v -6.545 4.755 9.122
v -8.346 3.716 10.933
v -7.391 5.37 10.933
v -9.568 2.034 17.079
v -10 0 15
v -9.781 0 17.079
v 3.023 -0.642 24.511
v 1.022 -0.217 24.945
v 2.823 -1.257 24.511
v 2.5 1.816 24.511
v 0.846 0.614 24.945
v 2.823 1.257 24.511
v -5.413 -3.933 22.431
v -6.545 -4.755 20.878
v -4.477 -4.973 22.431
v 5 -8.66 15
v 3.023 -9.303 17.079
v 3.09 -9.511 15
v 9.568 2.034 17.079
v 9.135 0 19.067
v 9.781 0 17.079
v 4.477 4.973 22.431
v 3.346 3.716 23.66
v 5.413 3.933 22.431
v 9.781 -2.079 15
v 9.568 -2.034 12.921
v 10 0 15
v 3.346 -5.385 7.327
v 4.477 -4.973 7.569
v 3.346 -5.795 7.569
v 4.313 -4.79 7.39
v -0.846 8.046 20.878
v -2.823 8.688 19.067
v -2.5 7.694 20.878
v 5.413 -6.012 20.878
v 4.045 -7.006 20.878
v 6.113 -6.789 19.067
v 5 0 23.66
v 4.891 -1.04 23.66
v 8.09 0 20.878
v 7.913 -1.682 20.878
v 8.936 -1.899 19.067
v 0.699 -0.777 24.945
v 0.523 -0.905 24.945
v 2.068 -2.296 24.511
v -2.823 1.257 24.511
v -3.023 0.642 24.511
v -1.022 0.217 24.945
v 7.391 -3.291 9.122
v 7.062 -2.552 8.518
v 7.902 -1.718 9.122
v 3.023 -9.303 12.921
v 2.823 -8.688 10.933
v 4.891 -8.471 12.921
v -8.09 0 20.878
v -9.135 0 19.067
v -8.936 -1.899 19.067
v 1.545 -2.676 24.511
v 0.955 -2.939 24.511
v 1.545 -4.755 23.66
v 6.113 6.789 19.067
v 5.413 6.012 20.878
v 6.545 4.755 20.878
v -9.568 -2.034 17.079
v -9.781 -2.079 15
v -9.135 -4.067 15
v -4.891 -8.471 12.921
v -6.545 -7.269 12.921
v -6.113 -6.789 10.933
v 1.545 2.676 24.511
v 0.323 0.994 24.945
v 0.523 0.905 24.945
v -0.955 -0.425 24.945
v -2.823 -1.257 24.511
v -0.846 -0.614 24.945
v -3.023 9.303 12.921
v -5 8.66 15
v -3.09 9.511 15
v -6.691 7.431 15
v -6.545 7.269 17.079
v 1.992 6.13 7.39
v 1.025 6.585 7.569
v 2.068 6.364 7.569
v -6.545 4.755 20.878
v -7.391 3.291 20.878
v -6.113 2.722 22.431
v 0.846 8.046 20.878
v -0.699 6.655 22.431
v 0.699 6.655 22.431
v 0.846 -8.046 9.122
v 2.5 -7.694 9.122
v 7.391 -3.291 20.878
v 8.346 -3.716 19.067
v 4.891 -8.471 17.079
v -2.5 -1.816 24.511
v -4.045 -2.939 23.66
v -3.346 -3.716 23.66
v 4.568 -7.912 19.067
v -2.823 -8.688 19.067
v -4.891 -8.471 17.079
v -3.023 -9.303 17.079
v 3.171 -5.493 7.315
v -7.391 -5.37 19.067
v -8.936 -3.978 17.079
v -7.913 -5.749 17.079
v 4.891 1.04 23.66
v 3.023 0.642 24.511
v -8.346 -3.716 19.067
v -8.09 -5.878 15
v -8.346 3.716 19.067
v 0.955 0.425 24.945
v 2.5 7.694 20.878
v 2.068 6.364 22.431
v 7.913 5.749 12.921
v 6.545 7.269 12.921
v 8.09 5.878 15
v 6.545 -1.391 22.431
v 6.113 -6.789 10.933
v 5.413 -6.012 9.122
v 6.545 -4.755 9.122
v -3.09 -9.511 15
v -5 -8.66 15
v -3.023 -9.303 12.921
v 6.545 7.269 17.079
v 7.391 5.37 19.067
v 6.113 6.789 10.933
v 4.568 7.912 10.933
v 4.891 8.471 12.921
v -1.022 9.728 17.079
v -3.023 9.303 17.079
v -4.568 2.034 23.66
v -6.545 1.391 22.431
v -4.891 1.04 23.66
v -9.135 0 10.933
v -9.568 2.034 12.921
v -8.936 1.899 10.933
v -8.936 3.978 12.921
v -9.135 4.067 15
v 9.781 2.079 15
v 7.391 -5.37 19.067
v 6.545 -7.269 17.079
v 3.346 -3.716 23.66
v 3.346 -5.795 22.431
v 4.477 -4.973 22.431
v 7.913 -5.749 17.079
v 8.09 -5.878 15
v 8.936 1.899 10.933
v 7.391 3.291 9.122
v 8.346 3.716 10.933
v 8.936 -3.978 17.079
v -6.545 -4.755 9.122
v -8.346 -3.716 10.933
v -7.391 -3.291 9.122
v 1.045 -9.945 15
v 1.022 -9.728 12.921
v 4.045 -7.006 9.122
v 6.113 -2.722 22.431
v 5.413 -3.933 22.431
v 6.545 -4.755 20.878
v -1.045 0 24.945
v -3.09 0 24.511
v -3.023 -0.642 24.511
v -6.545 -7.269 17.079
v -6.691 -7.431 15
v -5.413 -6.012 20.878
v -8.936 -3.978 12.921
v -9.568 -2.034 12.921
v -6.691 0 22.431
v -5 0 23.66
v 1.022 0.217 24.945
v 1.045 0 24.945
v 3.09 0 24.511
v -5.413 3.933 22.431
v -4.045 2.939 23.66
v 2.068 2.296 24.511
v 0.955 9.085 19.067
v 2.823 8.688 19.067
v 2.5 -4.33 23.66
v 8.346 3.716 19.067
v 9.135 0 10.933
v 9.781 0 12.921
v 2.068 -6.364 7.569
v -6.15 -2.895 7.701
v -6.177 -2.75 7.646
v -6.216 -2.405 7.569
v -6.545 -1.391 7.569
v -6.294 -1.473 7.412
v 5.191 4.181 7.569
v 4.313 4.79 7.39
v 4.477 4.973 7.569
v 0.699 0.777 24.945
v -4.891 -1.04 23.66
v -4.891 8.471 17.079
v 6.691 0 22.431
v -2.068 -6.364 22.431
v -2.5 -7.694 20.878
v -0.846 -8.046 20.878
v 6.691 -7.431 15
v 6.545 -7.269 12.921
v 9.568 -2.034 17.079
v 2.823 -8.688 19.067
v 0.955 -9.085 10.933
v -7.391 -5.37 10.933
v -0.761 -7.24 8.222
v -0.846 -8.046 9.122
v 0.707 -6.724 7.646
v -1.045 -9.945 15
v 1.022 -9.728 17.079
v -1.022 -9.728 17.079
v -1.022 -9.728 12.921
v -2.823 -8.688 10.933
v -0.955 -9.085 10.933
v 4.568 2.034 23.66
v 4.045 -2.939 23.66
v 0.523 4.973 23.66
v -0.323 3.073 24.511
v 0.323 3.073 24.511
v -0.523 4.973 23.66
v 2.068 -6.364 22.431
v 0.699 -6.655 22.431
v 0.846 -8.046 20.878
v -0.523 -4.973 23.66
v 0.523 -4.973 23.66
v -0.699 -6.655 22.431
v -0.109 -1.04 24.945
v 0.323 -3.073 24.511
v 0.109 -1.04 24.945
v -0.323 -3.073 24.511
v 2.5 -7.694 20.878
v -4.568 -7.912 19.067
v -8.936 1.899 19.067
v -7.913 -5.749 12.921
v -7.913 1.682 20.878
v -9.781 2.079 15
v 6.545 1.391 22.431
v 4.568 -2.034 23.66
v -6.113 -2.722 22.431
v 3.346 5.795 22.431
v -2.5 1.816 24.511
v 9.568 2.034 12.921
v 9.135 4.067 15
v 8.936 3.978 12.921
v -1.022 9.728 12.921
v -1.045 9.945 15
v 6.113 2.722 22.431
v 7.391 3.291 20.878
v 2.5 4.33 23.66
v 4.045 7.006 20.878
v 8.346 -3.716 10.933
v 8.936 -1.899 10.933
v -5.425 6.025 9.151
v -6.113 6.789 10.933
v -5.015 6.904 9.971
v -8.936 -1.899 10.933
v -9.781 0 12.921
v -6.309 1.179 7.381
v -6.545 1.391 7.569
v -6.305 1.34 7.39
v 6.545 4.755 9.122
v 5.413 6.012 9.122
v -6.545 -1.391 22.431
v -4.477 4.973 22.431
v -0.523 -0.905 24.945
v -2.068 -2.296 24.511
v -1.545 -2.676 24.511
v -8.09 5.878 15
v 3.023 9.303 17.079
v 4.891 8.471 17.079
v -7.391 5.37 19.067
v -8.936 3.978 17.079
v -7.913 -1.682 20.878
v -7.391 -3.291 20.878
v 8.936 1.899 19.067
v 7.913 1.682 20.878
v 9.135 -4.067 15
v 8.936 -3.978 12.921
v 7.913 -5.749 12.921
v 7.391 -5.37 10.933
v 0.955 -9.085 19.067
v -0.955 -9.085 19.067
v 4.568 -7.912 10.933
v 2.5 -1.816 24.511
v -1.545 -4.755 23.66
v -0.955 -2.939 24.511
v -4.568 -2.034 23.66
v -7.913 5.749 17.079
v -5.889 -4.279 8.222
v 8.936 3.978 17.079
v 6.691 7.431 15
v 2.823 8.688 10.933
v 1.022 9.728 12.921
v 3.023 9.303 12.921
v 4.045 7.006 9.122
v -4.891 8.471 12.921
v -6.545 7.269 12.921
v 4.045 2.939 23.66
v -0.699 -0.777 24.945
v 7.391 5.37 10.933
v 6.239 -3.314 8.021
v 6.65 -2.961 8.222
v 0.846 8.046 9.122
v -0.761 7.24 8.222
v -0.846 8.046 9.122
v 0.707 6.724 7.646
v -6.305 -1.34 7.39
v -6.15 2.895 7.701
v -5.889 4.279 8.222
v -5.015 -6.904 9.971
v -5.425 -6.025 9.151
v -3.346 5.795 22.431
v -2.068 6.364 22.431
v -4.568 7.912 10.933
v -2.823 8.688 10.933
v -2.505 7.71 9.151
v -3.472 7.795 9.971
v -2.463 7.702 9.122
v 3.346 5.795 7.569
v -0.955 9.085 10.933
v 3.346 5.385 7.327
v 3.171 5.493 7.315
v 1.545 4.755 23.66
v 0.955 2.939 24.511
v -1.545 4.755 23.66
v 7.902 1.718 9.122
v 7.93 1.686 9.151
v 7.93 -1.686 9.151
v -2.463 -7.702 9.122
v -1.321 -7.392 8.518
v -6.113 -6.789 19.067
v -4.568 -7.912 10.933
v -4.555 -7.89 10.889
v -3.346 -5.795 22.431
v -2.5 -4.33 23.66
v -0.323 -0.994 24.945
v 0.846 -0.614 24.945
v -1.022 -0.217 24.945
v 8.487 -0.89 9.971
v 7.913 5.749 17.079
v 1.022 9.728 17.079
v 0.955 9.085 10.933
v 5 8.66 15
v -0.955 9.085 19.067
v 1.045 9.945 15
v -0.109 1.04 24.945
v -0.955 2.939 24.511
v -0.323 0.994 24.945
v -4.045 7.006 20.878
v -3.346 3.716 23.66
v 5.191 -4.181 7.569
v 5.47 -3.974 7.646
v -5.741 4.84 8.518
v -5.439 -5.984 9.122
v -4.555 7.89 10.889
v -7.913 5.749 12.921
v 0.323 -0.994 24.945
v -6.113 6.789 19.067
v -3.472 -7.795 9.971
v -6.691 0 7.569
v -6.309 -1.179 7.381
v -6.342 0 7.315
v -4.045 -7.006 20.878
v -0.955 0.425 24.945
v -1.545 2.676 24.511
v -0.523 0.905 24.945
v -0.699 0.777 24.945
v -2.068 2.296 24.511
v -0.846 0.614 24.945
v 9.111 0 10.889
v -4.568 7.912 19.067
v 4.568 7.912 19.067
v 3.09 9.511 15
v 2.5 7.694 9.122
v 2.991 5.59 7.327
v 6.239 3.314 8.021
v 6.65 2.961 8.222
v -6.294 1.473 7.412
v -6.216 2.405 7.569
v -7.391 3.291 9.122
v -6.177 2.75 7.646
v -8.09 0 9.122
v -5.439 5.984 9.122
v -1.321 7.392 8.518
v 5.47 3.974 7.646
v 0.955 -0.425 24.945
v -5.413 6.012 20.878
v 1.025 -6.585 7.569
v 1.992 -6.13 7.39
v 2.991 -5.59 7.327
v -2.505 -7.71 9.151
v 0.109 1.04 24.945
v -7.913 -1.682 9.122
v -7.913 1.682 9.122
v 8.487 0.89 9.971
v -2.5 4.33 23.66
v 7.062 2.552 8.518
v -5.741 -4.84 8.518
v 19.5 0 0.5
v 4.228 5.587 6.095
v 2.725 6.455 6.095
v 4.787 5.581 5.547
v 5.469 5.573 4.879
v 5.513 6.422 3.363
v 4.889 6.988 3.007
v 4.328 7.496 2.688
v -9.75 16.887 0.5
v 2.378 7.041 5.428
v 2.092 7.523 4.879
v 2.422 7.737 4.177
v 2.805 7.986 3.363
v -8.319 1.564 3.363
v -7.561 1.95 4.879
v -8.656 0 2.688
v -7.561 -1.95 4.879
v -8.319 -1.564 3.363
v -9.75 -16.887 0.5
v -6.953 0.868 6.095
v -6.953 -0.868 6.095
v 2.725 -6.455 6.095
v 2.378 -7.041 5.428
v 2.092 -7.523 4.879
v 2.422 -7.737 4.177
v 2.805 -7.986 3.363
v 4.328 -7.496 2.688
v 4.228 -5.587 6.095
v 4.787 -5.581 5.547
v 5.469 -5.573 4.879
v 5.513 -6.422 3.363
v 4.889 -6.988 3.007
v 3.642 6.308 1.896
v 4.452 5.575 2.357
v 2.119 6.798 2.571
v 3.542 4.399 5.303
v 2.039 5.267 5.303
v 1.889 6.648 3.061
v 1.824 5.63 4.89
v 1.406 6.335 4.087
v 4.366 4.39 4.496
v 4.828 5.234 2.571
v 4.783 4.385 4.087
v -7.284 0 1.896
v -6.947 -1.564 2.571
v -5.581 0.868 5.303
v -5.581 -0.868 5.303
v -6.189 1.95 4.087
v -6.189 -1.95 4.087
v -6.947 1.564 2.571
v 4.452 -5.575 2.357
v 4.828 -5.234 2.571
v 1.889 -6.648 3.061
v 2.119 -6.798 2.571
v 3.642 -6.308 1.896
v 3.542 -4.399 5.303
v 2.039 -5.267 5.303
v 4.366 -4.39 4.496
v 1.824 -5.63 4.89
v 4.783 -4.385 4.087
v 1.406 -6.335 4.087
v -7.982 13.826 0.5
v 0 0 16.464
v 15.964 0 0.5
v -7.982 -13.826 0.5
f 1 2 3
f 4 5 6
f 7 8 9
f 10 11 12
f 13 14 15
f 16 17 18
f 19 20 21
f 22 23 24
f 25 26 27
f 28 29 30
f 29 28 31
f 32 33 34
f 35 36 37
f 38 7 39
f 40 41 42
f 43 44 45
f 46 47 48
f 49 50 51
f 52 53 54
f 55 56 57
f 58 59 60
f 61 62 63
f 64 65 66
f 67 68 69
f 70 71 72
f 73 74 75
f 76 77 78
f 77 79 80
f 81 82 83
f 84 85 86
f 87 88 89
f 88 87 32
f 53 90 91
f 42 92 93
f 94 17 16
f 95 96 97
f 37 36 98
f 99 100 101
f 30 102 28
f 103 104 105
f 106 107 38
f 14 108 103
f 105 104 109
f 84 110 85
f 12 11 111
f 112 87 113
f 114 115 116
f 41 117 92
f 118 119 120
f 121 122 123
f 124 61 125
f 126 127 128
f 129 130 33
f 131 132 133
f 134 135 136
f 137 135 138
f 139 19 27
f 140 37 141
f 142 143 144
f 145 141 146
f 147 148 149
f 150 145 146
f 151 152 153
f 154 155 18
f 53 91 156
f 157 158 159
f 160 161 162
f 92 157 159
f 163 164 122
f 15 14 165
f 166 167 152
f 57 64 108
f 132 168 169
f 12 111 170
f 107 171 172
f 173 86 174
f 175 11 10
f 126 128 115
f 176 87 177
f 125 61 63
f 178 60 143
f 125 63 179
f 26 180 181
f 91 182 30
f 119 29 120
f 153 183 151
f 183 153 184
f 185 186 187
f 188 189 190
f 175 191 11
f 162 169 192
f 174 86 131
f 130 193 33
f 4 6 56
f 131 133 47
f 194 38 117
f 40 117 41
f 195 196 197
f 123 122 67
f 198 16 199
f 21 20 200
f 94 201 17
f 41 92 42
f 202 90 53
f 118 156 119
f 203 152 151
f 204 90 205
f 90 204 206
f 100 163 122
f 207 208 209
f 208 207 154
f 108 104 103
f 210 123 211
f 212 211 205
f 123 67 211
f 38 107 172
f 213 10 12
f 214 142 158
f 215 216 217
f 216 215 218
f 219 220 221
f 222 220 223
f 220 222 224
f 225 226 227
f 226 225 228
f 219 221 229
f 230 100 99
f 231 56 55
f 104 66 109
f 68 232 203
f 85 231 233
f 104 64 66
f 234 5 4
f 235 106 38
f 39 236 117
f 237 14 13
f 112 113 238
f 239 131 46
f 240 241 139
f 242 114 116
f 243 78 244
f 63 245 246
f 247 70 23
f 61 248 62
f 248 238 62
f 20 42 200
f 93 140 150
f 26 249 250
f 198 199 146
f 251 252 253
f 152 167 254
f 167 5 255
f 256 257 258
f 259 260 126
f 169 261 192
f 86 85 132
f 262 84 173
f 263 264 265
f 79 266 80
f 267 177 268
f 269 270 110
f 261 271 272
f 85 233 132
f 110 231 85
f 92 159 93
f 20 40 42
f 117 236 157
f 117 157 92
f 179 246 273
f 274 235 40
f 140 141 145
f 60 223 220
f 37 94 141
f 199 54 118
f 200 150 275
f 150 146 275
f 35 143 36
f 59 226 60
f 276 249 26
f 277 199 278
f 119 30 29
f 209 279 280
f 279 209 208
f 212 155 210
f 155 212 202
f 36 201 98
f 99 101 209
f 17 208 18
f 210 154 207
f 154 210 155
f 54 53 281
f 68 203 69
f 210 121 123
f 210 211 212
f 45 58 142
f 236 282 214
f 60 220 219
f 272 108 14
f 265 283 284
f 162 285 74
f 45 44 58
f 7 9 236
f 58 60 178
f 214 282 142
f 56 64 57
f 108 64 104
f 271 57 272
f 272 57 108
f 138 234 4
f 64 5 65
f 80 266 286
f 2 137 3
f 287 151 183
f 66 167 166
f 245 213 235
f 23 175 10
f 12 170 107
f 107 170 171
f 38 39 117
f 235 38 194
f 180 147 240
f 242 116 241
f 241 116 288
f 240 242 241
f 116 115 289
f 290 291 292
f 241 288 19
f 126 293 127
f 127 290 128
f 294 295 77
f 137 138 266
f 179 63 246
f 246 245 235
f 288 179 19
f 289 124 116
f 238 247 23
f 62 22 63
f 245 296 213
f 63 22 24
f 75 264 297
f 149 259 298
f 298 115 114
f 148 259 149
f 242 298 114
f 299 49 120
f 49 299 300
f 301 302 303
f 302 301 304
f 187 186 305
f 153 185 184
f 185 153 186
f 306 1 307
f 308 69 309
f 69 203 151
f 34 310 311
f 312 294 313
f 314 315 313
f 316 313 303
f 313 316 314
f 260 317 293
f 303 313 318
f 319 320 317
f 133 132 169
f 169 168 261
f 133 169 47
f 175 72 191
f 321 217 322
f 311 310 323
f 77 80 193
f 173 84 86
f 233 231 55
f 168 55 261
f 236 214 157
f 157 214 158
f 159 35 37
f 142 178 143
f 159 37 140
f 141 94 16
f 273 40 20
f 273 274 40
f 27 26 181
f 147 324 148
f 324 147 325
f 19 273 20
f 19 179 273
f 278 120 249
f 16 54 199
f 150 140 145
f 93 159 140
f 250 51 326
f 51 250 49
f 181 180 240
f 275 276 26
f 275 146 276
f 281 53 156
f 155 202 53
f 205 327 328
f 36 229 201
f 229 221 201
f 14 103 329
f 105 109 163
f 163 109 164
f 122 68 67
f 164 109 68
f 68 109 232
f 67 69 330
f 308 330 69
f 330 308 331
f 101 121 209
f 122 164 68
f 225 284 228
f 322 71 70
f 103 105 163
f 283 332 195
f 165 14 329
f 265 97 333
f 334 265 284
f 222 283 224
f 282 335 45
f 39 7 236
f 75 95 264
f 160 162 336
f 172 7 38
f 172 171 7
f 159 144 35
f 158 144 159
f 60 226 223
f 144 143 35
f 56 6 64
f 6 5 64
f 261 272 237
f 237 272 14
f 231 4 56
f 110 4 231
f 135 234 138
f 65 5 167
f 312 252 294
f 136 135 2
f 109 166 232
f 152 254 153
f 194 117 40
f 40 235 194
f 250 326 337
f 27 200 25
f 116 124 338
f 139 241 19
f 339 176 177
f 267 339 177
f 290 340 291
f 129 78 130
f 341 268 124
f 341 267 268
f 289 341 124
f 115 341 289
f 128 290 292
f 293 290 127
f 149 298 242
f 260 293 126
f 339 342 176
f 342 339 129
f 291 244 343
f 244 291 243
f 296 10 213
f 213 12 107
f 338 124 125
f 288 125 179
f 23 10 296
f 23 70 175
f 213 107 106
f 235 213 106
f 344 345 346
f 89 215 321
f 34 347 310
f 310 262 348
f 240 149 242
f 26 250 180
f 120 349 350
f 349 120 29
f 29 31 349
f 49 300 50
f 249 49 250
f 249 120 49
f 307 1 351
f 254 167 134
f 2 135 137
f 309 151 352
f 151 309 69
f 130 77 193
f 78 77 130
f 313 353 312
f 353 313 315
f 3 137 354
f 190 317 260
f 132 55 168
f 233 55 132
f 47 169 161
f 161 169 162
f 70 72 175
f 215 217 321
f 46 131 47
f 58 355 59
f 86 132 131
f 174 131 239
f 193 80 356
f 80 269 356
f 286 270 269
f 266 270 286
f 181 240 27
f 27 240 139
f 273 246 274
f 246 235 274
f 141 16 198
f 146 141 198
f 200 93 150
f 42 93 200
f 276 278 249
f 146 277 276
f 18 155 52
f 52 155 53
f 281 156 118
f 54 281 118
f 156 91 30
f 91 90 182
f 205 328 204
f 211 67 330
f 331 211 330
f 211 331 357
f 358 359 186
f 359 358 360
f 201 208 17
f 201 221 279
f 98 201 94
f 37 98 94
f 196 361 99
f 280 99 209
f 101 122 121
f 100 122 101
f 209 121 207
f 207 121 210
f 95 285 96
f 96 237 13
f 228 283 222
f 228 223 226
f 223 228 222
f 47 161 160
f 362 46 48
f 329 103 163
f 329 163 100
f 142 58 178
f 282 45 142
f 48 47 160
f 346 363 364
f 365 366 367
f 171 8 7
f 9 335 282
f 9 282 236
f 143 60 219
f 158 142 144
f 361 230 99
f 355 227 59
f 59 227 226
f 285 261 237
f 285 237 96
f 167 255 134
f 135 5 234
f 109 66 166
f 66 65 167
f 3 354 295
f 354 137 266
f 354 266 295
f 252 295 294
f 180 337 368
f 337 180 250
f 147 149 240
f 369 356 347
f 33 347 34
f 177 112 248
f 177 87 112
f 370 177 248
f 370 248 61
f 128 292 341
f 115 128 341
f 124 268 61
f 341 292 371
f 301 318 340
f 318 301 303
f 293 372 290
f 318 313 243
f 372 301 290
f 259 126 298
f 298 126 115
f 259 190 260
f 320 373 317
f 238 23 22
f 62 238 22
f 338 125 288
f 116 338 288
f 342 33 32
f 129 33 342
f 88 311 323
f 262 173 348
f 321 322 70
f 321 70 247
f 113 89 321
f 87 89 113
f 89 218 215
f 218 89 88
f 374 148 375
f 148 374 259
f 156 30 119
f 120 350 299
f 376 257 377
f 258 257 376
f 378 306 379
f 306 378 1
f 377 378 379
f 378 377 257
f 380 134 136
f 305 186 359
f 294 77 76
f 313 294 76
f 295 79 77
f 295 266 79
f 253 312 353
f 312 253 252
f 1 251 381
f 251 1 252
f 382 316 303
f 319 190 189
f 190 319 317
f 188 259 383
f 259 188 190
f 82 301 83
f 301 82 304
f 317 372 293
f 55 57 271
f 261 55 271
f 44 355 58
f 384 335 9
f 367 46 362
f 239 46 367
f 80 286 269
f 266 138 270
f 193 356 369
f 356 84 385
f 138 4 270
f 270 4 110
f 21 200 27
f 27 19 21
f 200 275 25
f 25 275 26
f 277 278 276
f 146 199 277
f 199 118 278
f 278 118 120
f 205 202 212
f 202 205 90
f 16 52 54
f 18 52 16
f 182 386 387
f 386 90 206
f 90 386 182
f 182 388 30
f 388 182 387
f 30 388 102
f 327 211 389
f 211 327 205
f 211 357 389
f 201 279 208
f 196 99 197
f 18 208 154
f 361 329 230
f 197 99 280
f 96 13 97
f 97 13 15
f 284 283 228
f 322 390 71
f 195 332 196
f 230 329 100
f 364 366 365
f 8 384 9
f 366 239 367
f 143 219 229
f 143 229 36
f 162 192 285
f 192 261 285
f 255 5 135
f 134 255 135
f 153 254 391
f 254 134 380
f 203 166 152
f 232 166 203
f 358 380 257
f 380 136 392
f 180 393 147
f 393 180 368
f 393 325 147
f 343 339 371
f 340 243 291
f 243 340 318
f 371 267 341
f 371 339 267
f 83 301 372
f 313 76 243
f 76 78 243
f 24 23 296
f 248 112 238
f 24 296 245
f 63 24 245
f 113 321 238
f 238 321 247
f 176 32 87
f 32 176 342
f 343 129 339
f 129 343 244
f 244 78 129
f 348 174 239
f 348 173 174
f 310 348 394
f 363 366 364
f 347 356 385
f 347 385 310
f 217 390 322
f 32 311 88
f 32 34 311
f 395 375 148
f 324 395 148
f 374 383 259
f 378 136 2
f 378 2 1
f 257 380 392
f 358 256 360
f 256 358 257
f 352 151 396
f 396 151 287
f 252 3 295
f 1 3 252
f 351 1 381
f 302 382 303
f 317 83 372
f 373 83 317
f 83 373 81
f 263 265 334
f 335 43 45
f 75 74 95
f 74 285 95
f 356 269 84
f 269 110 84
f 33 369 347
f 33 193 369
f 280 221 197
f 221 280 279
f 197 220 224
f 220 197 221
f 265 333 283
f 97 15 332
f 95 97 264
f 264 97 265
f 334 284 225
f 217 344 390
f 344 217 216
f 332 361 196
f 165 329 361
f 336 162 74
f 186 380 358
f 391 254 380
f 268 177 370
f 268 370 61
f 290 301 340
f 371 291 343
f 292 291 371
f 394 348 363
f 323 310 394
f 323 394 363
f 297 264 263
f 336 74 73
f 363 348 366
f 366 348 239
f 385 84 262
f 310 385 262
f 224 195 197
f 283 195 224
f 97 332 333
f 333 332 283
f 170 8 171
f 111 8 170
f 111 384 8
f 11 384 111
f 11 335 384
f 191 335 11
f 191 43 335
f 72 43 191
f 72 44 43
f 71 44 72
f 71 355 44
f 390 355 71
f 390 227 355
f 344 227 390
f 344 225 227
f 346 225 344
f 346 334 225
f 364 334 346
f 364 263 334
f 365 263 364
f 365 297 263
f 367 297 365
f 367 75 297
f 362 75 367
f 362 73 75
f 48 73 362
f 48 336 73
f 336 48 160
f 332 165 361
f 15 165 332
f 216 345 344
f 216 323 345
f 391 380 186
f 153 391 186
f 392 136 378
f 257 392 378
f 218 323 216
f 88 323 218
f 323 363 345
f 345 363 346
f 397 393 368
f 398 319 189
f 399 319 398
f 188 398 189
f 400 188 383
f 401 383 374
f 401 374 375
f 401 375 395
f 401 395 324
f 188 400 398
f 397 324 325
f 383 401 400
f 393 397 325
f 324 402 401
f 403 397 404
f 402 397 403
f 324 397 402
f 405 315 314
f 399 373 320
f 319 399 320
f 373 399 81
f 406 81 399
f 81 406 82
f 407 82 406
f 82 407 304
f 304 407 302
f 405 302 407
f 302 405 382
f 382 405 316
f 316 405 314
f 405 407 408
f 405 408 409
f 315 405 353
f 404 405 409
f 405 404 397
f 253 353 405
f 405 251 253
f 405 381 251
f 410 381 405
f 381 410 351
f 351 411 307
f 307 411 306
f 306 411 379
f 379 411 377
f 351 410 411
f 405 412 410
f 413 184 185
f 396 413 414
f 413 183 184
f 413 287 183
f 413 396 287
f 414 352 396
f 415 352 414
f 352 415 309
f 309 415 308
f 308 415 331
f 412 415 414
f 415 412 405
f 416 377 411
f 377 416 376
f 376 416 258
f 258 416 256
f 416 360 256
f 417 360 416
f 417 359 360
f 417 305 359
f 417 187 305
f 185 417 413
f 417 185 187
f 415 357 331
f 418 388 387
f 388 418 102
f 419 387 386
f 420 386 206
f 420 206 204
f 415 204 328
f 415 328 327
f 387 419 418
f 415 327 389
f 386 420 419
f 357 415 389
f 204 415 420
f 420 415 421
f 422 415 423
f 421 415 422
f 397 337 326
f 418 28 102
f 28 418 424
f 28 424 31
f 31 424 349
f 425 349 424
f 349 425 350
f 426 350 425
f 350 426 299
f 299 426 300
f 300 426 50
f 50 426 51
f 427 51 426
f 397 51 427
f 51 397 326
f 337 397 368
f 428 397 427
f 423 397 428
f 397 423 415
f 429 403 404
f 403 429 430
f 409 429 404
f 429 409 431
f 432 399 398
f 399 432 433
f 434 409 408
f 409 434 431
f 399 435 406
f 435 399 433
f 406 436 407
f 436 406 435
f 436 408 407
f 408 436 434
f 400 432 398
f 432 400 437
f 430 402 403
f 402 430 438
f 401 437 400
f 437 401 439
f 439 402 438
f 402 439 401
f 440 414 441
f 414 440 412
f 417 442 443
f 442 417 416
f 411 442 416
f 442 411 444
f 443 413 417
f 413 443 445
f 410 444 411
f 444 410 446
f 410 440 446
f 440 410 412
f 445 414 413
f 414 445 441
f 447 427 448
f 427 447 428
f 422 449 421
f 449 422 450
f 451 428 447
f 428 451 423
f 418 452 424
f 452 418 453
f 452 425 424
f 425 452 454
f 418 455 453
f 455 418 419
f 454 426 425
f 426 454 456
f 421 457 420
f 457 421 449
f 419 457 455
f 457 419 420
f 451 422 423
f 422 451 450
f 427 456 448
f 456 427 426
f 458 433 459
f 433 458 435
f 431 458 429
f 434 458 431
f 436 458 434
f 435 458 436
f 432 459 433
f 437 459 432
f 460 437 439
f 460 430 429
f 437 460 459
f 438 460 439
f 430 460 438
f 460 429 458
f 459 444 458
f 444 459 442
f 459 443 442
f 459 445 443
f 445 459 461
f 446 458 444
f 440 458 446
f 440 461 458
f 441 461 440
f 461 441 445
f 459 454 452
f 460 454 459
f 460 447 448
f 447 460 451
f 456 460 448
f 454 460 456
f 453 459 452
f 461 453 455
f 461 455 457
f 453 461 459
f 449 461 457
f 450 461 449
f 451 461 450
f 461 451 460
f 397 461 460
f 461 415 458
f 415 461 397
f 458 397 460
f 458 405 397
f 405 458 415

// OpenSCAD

r = 10;
r2 = 2 * r;

d = 2.5;
s = 4;

difference()
{
	union()
	{
		translate( [ 0, 0, r2*3/4 ] )
			sphere( r = r, center = true );
		translate( [ 0, 0, r2/2 ] )
			cylinder( r1 = r2, r2 = 0, h = r2, center = true, $fn = 3 );
	}

	translate( [ 0, 0, r2/2-d*sqrt(2) ] )
		cylinder( r1 = r2, r2 = 0, h = r2, center = true, $fn = 3 );

	cube( [ r*4, r*4, 1 ], center = true );

	for ( a = [ 0, 120, 240 ] ) rotate( a+60, [ 0, 0, 1 ] )
		translate( [ r2*cos(60), 0, 0 ] )
			rotate( [ 0, 60, 0 ] )
				translate( [ -1.25*s, 0, 0 ] )
			cylinder( r = s/2, h = d*3, center = true );
}
